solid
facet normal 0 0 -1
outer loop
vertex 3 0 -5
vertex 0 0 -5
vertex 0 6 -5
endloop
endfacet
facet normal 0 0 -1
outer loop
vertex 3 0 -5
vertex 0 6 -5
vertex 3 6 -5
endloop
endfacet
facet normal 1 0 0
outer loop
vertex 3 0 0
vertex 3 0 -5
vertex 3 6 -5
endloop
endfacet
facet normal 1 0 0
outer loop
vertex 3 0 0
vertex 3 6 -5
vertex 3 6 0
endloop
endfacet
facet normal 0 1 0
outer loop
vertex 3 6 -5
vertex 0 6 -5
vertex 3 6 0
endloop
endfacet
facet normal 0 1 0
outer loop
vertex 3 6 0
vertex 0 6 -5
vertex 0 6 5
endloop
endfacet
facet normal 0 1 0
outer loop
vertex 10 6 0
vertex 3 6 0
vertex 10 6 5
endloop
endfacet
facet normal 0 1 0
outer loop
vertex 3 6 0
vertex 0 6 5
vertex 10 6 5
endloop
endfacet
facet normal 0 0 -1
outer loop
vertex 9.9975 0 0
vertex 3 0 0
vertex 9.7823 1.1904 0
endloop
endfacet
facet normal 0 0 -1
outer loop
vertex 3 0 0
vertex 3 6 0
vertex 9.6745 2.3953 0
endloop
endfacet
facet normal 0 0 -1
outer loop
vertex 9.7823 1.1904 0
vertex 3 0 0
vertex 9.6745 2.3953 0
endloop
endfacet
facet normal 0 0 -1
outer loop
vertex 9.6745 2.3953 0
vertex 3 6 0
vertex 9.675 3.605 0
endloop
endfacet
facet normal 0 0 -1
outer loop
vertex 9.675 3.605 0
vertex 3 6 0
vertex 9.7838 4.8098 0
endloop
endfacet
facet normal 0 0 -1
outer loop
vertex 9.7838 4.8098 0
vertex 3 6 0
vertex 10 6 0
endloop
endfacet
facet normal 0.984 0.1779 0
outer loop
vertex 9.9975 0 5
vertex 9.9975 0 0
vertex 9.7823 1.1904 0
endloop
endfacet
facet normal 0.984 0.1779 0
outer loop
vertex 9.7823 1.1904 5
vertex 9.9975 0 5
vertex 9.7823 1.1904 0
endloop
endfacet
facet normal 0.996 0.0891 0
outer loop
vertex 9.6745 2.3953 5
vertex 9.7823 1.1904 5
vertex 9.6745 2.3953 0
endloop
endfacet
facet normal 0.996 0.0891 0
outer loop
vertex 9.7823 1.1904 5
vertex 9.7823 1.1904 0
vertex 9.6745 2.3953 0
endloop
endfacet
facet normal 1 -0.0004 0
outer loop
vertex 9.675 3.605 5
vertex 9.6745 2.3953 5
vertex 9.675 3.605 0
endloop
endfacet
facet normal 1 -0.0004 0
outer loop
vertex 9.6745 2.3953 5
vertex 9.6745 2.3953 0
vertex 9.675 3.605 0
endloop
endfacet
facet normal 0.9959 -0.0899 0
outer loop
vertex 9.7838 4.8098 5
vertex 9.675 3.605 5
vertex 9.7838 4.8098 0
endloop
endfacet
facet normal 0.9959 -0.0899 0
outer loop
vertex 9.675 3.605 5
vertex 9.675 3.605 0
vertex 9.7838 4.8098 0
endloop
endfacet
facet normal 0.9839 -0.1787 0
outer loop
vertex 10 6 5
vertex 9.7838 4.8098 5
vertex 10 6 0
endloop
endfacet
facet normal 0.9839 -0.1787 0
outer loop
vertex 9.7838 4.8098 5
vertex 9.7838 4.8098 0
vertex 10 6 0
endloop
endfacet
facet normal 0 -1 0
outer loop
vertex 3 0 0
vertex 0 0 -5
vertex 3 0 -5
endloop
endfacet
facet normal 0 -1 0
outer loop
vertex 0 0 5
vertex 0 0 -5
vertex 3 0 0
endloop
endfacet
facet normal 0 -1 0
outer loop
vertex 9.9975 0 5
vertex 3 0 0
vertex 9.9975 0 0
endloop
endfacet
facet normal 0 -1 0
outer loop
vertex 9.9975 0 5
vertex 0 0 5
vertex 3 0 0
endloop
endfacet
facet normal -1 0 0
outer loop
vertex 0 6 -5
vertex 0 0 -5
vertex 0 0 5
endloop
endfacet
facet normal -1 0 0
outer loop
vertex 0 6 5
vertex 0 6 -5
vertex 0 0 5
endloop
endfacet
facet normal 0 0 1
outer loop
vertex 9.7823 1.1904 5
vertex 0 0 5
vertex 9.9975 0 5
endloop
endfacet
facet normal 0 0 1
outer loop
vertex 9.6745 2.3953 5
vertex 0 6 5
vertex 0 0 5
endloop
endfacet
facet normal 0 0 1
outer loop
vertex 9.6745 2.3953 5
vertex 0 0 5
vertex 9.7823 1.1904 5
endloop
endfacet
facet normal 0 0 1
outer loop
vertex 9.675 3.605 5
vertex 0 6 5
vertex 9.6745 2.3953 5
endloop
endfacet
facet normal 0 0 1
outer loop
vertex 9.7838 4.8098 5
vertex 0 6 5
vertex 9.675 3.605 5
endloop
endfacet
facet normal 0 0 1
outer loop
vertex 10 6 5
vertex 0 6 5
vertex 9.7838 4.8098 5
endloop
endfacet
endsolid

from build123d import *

# Parameters (mm, degrees)
F1_DEPTH = 5
F2_W     = 3
F2_H     = 5
F3_DEPTH = 6


with BuildPart() as f1:
    # F0 (on Top) → F1 (new body)
    with BuildSketch(Plane.XY):
        with BuildLine():
            ThreePointArc((9.997487, 0), (9.66119, 3.000141), (10, 6))
            Line((10, 6), (0, 6))
            Line((0, 6), (0, 0))
            Line((0, 0), (9.997487, 0))
        make_face()
    extrude(amount=F1_DEPTH)

    # F2 (on face) → F3 (join)
    with BuildSketch(Plane.XZ):
        with Locations((1.5, -2.5)):
            Rectangle(F2_W, F2_H)
    extrude(amount=-F3_DEPTH)


solid = f1.part
